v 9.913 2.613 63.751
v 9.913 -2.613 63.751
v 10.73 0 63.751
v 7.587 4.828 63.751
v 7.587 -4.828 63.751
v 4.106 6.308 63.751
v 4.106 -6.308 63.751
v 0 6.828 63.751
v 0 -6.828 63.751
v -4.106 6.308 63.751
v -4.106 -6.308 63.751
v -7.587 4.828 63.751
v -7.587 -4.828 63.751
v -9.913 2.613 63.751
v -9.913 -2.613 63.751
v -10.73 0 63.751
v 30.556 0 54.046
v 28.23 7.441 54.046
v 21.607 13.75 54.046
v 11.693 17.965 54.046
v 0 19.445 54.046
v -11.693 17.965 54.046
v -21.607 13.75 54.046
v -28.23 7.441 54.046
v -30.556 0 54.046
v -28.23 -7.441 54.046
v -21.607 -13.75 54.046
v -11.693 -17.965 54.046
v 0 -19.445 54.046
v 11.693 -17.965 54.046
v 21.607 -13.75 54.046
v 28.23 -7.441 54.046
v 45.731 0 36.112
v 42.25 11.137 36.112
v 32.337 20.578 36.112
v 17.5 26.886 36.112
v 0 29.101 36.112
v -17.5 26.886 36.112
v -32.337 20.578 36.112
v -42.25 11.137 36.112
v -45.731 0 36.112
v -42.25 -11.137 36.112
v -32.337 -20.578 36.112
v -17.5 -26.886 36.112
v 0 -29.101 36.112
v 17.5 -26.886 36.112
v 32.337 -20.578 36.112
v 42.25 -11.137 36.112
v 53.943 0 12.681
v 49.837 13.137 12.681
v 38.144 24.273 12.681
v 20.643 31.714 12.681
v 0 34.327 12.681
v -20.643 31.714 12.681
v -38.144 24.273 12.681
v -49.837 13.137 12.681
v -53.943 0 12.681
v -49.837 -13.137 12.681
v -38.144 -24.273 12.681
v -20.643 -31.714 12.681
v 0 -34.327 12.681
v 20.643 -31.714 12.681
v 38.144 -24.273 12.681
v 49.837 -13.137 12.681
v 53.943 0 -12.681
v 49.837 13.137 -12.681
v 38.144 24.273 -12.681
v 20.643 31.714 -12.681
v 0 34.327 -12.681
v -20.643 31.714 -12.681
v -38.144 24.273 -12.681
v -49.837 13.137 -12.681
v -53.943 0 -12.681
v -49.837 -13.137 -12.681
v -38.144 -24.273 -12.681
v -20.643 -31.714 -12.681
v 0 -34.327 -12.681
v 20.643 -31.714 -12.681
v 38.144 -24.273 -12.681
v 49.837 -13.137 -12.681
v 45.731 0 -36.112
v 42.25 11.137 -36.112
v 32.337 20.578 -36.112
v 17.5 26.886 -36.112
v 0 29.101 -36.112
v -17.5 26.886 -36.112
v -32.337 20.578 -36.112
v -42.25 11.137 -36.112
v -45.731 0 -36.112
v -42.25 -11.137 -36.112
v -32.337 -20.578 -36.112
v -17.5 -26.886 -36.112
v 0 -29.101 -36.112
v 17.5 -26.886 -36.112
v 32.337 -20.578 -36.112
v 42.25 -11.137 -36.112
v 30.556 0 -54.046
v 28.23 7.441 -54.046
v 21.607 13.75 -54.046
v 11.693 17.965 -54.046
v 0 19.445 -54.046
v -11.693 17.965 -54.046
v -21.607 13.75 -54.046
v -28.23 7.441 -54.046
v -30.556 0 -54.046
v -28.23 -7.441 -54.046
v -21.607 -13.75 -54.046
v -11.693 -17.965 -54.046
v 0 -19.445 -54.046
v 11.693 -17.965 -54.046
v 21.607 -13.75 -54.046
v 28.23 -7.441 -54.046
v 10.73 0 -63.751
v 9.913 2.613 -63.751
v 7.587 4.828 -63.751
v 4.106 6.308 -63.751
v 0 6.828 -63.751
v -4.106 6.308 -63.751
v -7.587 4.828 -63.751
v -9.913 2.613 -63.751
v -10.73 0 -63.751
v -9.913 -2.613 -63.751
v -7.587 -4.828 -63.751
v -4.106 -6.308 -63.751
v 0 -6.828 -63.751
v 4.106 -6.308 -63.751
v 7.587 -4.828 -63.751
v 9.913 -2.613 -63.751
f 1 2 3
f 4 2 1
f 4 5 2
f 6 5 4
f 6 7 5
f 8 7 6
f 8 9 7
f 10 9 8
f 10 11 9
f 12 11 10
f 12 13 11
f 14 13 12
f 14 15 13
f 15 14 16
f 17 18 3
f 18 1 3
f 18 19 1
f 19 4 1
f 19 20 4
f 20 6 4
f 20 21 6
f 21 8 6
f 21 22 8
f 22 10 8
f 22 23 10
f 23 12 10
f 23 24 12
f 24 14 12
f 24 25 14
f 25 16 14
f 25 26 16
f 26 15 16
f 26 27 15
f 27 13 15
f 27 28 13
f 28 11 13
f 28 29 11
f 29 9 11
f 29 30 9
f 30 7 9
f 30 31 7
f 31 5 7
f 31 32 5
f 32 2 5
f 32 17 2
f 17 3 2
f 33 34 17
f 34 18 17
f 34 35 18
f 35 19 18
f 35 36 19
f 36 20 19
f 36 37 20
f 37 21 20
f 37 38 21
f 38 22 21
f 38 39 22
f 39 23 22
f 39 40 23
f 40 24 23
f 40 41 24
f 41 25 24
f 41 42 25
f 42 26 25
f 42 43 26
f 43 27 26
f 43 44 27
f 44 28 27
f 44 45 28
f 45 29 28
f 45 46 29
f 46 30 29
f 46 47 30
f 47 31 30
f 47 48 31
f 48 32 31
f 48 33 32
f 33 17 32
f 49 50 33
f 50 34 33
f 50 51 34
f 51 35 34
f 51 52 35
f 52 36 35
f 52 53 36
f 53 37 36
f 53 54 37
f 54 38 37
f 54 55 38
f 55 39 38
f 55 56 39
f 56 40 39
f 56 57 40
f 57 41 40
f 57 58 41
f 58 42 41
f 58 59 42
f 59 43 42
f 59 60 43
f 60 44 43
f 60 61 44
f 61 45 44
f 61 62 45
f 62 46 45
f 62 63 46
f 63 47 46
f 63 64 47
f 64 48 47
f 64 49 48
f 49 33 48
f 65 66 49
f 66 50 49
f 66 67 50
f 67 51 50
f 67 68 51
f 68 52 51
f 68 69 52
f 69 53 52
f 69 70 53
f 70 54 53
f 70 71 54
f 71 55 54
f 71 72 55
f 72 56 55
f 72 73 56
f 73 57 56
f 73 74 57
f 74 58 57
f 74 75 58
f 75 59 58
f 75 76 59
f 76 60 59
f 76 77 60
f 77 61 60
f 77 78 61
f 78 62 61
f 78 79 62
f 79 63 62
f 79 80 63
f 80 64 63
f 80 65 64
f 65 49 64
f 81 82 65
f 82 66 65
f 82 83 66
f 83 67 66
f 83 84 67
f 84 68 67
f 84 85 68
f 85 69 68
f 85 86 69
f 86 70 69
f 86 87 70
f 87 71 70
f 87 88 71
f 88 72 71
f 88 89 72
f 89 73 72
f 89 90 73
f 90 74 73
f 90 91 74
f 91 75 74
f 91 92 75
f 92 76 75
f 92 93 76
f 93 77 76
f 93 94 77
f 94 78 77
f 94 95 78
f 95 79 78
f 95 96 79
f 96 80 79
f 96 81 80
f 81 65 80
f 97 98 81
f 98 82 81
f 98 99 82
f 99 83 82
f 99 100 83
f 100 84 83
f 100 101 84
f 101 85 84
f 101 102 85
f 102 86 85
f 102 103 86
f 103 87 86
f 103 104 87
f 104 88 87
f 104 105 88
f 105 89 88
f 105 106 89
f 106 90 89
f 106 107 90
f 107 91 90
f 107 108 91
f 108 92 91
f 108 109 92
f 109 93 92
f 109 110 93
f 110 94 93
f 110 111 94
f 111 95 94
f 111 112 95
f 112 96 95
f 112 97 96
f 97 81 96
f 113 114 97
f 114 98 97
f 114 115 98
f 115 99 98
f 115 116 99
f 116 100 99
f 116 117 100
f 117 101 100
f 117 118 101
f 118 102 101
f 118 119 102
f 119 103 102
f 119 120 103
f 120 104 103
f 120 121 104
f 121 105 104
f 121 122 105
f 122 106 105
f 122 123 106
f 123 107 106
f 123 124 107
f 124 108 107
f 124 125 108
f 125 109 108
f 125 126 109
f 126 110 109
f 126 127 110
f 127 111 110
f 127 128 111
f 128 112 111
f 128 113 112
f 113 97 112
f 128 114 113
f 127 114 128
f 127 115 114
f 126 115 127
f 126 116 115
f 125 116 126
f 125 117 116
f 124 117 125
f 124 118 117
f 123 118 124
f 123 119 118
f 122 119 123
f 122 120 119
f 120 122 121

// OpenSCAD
// Generated by SolidPython 1.0.1 on 2020-07-29 00:46:49


scale(v = [11, 7, 13]) {
	sphere(r = 5);
}
/***********************************************
*********      SolidPython code:      **********
************************************************
 
# import packages: SolidPython
from solid import *
from solid.utils import *
from itertools import chain, combinations, permutations


class Resize:

    def __init__(self, scad_file):
        self.scad_file = scad_file
        #self.scad_file = import_scad(scad_file)
        # cone/cylinder param:
        self.r1 = 0
        self.r2 = 0
        self.h = 0
        # rectangular prism param:
        self.w = 0
        self.l = 0
        # ellipse param:
        self.r = 0

    # import OpenScad code (file name corresponds to shape)


    # classify shape + parameters
    def assign(self, param1, param2, param3):
        if self.scad_file == 'cone.scad':
            self.r1 = param1
            self.r2 = param2
            self.h = param3
        elif self.scad_file == 'cylinder.scad':
            self.r1 = param1
            self.r2 = param2
            self.h = param3
        elif self.scad_file == 'rectangularPrism.scad':
            self.h = param1
            self.l = param2
            self.w = param3
        else:
            self.r = param1
            self.h = param2

    # resize parameters
    def iterate(self):
        x = range(3, 20, 2)
        i = 1
        if self.scad_file == 'cone.scad':
            tempList = list(permutations(x, 2))
            for temp in tempList:
                param1 = temp[0]
                param2 = temp[1]
                filepath = 'produced_scad_files/' + 'cone' + str(param1) + '_' + str(param2) + '_' + '.scad'
                scad_render_to_file(cylinder(h=param1, r1=param2, r2=0), filepath)

        elif self.scad_file == 'cylinder.scad':
            tempList = list(permutations(x, 3))
            for temp in tempList:
                param1 = temp[0]
                param2 = temp[1]
                filepath = 'produced_scad_files/' + 'cylinder' + str(param1) + '_' + str(param2) + '_' + '.scad'
                scad_render_to_file(cylinder(h=param1, r1=param2, r2=param2), filepath)

        elif self.scad_file == 'rectangularPrism.scad':
            tempList = list(permutations(x, 3))
            for temp in tempList:
                param1 = temp[0]
                param2 = temp[1]
                param3 = temp[2]
                filepath = 'produced_scad_files/' + 'rectangularPrism' + str(param1) + '_' + str(param2) + '_' + str(
                    param3) + '.scad'
                scad_render_to_file(cube(size=(param1, param2, param3)), filepath)

        elif self.scad_file == 'ellipse.scad':
            tempList = list(permutations(x, 4))
            for temp in tempList:
                param1 = temp[0]
                param2 = temp[1]
                param3 = temp[2]
                param4 = temp[3]
                filepath = 'produced_scad_files/' + 'ellipse' + str(param1) + '_' + str(param2) + '_' + str(param3) + '_' + str(param4) + '.scad'
                scad_render_to_file(scale([param1, param2, param3])(sphere(r=param4)), filepath)

    def render_to_scadfile(self):
        scad_render_to_file(scad, 'example.scad') 
 
************************************************/
